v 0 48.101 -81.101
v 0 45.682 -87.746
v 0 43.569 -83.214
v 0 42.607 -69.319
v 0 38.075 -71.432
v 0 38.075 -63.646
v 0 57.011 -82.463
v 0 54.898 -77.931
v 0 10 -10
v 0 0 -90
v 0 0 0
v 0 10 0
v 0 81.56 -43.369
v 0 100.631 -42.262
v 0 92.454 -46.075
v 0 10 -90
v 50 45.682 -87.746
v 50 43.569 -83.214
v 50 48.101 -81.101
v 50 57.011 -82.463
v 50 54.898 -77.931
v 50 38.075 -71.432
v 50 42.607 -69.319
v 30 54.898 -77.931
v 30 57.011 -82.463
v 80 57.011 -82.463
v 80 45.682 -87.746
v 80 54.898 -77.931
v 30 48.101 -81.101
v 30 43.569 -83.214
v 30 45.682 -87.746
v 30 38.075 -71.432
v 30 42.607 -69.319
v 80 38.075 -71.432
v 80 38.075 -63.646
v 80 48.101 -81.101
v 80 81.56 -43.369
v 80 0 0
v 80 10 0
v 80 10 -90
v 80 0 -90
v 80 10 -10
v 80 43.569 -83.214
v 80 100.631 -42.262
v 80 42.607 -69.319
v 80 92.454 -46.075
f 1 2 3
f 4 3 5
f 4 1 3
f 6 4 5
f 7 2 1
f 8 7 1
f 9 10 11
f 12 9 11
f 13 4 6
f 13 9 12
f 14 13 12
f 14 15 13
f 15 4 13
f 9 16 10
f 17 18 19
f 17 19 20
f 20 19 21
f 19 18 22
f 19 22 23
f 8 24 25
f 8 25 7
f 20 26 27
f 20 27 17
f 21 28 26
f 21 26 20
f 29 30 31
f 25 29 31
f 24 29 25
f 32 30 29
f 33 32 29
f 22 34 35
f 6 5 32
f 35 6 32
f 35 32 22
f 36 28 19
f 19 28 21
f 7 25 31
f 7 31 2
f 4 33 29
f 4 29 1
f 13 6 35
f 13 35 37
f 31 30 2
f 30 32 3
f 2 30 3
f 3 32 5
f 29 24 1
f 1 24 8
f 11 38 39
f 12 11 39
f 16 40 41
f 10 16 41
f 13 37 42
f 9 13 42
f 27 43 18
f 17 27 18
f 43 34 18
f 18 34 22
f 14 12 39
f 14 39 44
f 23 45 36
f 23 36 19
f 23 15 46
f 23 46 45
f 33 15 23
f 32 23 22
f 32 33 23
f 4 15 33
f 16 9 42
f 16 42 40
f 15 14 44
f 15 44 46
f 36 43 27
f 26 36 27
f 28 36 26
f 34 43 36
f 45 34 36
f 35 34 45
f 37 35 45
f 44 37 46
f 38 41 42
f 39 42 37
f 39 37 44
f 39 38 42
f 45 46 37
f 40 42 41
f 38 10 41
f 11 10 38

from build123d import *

# Parameters (mm, degrees)
BOSS_EXTRUDE1_DEPTH = 80
SKETCH2_W           = 30
SKETCH2_H           = 5
BOSS_EXTRUDE2_DEPTH = 13
SKETCH3_W           = 30
SKETCH3_H           = 12.5
BOSS_EXTRUDE3_DEPTH = 5


with BuildPart() as part:
    # Sketch1 → Boss-Extrude1 (new body)
    with BuildSketch(Plane(origin=(0, 0, 0), x_dir=(0, 0, -1), z_dir=(1, 0, 0))):
        Polygon((0, 10), (42.261826174, 100.630778704), (46.074889763, 92.453637449), (71.431985467, 38.075170227), (63.645988922, 38.075170227), (43.368827902, 81.559682364), (10, 10), (90, 10), (90, 0), (0, 0), align=None)
    extrude(amount=BOSS_EXTRUDE1_DEPTH)

    # Sketch2 → Boss-Extrude2 (add)
    with BuildSketch(Plane(origin=(0, 34.160499048, -73.257426617), x_dir=(-1, 0, 0), z_dir=(0, 0.4226182617406983, -0.9063077870366506))):
        with Locations((-65, 6.819361739)):
            Rectangle(SKETCH2_W, SKETCH2_H)
        with Locations((-15, 6.819361739)):
            Rectangle(SKETCH2_W, SKETCH2_H)
    extrude(amount=BOSS_EXTRUDE2_DEPTH)

    # Sketch3 → Boss-Extrude3 (add)
    with BuildSketch(Plane(origin=(0, 39.654536451, -85.039427849), x_dir=(-1, 0, 0), z_dir=(0, 0.4226182617406977, -0.9063077870366508))):
        with Locations((-65, 10.569361739)):
            Rectangle(SKETCH3_W, SKETCH3_H)
        with Locations((-15, 10.569361739)):
            Rectangle(SKETCH3_W, SKETCH3_H)
    extrude(amount=BOSS_EXTRUDE3_DEPTH)


solid = part.part
